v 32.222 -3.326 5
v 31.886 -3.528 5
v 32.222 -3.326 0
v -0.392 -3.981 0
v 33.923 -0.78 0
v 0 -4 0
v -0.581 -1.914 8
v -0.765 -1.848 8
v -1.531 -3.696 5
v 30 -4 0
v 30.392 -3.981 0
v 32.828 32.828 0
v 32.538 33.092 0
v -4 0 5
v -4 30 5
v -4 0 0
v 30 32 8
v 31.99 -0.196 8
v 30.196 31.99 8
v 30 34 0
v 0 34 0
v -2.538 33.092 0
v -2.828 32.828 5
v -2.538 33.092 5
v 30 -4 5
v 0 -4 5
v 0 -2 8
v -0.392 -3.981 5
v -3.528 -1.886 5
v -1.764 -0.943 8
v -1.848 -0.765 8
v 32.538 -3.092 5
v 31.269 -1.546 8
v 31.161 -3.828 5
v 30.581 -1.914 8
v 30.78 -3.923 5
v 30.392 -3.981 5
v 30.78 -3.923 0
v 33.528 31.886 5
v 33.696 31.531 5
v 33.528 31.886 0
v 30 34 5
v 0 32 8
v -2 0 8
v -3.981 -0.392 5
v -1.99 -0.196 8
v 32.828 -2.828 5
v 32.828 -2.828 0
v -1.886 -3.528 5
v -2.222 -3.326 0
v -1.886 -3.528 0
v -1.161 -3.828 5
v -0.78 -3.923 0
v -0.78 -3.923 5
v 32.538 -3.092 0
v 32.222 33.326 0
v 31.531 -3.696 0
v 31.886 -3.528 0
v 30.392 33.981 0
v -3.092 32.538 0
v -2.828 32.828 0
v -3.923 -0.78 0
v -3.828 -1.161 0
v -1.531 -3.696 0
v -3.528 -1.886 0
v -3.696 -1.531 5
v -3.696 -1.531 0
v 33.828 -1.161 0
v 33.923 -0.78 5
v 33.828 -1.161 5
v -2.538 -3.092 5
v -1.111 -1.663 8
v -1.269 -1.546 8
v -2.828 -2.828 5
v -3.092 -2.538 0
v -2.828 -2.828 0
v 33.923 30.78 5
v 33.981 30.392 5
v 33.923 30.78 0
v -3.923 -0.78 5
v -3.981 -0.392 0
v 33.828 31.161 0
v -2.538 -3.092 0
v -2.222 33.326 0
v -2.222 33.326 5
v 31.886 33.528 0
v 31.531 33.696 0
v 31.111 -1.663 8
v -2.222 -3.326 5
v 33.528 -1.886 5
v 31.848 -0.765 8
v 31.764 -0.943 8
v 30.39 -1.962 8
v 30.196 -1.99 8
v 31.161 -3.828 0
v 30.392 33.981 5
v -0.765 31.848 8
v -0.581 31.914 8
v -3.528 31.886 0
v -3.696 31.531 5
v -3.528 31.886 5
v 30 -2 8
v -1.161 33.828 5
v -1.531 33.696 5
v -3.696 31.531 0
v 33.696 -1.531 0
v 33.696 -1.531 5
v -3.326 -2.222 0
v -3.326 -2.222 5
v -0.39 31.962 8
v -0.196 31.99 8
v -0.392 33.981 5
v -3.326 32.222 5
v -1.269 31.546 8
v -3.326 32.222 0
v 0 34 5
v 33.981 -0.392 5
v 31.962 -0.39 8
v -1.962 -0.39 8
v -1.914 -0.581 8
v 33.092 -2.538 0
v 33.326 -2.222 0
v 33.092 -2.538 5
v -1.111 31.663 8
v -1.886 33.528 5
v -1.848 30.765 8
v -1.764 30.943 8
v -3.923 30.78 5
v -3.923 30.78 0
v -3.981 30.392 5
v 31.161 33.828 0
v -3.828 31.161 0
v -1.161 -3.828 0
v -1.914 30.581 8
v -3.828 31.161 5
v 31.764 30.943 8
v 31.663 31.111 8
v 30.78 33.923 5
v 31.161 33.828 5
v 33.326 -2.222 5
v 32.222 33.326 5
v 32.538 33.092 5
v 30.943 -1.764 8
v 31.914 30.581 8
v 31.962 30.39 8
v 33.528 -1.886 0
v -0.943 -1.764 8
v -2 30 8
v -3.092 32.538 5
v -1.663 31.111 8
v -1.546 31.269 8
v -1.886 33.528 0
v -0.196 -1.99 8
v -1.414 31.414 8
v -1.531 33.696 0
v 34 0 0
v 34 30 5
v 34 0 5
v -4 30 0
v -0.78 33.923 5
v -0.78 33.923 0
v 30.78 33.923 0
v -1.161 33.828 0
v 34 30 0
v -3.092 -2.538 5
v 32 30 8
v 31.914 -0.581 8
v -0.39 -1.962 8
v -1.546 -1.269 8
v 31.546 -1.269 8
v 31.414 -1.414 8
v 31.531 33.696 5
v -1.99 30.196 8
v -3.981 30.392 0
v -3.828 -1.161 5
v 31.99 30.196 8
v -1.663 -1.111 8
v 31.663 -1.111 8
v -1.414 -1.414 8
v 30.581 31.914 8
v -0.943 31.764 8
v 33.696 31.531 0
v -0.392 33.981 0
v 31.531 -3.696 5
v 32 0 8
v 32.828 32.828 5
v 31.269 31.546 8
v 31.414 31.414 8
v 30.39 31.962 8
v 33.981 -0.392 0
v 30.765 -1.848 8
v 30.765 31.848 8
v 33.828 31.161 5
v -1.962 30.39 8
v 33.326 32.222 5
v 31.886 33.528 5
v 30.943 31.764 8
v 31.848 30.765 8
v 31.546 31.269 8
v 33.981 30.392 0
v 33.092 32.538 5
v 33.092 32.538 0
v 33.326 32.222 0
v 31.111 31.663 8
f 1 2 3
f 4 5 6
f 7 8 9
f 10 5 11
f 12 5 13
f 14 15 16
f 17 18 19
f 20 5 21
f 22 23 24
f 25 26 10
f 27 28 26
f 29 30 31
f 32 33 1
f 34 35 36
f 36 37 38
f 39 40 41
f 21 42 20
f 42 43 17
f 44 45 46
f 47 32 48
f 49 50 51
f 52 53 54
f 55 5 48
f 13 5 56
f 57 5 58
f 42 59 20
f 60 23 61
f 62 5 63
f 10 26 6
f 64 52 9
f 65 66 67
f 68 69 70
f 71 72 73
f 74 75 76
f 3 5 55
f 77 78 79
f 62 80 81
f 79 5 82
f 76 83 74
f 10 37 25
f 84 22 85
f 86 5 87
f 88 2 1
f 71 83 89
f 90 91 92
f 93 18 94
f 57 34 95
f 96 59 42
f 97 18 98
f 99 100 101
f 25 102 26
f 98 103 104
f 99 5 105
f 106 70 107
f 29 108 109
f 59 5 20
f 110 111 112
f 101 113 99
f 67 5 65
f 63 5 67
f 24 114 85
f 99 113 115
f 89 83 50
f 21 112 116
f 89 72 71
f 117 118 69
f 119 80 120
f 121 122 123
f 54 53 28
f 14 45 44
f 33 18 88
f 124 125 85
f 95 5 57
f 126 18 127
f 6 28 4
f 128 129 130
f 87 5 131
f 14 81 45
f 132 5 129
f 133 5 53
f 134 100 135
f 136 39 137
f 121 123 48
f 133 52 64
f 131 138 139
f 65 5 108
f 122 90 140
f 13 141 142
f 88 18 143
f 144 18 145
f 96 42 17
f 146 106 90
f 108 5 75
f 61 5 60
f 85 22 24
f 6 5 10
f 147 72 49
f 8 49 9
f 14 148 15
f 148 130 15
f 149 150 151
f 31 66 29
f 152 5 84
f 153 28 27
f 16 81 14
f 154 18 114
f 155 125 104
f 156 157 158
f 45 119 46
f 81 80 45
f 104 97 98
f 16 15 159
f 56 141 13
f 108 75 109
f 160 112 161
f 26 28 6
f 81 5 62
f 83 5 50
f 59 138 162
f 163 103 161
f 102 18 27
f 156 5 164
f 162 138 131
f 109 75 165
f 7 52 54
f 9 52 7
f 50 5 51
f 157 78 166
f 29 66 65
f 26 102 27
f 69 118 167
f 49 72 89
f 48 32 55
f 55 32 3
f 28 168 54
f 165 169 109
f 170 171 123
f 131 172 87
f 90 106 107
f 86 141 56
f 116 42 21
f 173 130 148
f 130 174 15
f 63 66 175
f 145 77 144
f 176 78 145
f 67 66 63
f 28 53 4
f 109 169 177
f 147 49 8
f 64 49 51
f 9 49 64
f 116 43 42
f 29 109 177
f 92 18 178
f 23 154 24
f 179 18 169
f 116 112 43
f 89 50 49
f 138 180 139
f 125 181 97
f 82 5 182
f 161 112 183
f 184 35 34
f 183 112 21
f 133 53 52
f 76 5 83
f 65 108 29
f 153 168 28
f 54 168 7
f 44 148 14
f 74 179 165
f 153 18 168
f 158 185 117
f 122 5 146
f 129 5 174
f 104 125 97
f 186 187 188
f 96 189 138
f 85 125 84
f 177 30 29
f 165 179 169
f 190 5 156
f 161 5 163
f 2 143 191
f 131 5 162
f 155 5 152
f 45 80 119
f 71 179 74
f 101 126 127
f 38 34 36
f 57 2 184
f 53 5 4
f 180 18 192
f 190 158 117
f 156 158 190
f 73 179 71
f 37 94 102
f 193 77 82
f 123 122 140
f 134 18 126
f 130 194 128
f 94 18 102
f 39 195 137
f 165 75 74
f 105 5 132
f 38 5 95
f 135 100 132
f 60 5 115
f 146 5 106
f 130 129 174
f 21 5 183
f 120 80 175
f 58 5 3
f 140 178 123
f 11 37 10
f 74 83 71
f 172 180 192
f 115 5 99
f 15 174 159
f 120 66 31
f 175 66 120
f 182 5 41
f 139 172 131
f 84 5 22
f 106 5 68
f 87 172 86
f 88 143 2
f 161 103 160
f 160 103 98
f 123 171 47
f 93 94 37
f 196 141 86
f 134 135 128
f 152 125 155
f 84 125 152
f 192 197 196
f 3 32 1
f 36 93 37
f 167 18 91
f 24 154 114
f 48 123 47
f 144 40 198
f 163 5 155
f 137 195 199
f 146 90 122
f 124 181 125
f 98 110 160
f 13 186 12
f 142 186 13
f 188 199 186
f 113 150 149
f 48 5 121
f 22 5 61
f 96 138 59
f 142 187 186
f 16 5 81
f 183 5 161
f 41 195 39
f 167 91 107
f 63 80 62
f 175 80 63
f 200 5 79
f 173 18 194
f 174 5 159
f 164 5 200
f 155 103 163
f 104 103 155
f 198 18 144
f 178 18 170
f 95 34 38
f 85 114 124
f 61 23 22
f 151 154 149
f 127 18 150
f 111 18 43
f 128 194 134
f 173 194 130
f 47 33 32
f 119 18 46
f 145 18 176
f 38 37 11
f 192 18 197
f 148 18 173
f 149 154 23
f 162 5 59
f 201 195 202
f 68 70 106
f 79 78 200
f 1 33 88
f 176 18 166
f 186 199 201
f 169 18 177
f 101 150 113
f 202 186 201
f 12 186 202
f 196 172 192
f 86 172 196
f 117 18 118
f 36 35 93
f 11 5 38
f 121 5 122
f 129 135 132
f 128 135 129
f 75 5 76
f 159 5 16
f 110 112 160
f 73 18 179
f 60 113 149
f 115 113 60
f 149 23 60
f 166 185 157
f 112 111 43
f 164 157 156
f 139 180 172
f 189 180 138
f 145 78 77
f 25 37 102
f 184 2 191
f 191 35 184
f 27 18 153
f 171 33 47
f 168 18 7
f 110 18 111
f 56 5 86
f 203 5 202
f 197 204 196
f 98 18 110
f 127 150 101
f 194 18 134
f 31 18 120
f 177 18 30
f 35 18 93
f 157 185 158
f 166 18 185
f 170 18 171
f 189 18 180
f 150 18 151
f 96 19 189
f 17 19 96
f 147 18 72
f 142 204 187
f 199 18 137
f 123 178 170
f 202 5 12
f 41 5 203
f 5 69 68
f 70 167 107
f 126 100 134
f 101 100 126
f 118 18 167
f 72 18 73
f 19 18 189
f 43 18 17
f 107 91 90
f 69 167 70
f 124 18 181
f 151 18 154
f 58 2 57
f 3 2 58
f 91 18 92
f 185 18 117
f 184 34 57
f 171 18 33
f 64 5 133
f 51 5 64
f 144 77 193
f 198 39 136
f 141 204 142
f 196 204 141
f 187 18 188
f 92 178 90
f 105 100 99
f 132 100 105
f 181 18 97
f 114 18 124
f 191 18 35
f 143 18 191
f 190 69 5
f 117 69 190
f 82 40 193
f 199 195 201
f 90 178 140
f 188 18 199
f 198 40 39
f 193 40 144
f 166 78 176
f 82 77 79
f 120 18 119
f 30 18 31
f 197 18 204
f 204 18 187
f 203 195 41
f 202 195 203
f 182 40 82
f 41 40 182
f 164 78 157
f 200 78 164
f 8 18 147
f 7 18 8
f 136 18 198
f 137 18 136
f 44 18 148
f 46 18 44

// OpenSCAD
hull() for (x = [0, 30], y = [0, 30]) translate([x, y, 0]) { cylinder(h = 5, r = 4, $fn = 64); translate([0, 0, 5]) cylinder(h = 3, r1 = 4, r2 = 2, $fn = 64); }
